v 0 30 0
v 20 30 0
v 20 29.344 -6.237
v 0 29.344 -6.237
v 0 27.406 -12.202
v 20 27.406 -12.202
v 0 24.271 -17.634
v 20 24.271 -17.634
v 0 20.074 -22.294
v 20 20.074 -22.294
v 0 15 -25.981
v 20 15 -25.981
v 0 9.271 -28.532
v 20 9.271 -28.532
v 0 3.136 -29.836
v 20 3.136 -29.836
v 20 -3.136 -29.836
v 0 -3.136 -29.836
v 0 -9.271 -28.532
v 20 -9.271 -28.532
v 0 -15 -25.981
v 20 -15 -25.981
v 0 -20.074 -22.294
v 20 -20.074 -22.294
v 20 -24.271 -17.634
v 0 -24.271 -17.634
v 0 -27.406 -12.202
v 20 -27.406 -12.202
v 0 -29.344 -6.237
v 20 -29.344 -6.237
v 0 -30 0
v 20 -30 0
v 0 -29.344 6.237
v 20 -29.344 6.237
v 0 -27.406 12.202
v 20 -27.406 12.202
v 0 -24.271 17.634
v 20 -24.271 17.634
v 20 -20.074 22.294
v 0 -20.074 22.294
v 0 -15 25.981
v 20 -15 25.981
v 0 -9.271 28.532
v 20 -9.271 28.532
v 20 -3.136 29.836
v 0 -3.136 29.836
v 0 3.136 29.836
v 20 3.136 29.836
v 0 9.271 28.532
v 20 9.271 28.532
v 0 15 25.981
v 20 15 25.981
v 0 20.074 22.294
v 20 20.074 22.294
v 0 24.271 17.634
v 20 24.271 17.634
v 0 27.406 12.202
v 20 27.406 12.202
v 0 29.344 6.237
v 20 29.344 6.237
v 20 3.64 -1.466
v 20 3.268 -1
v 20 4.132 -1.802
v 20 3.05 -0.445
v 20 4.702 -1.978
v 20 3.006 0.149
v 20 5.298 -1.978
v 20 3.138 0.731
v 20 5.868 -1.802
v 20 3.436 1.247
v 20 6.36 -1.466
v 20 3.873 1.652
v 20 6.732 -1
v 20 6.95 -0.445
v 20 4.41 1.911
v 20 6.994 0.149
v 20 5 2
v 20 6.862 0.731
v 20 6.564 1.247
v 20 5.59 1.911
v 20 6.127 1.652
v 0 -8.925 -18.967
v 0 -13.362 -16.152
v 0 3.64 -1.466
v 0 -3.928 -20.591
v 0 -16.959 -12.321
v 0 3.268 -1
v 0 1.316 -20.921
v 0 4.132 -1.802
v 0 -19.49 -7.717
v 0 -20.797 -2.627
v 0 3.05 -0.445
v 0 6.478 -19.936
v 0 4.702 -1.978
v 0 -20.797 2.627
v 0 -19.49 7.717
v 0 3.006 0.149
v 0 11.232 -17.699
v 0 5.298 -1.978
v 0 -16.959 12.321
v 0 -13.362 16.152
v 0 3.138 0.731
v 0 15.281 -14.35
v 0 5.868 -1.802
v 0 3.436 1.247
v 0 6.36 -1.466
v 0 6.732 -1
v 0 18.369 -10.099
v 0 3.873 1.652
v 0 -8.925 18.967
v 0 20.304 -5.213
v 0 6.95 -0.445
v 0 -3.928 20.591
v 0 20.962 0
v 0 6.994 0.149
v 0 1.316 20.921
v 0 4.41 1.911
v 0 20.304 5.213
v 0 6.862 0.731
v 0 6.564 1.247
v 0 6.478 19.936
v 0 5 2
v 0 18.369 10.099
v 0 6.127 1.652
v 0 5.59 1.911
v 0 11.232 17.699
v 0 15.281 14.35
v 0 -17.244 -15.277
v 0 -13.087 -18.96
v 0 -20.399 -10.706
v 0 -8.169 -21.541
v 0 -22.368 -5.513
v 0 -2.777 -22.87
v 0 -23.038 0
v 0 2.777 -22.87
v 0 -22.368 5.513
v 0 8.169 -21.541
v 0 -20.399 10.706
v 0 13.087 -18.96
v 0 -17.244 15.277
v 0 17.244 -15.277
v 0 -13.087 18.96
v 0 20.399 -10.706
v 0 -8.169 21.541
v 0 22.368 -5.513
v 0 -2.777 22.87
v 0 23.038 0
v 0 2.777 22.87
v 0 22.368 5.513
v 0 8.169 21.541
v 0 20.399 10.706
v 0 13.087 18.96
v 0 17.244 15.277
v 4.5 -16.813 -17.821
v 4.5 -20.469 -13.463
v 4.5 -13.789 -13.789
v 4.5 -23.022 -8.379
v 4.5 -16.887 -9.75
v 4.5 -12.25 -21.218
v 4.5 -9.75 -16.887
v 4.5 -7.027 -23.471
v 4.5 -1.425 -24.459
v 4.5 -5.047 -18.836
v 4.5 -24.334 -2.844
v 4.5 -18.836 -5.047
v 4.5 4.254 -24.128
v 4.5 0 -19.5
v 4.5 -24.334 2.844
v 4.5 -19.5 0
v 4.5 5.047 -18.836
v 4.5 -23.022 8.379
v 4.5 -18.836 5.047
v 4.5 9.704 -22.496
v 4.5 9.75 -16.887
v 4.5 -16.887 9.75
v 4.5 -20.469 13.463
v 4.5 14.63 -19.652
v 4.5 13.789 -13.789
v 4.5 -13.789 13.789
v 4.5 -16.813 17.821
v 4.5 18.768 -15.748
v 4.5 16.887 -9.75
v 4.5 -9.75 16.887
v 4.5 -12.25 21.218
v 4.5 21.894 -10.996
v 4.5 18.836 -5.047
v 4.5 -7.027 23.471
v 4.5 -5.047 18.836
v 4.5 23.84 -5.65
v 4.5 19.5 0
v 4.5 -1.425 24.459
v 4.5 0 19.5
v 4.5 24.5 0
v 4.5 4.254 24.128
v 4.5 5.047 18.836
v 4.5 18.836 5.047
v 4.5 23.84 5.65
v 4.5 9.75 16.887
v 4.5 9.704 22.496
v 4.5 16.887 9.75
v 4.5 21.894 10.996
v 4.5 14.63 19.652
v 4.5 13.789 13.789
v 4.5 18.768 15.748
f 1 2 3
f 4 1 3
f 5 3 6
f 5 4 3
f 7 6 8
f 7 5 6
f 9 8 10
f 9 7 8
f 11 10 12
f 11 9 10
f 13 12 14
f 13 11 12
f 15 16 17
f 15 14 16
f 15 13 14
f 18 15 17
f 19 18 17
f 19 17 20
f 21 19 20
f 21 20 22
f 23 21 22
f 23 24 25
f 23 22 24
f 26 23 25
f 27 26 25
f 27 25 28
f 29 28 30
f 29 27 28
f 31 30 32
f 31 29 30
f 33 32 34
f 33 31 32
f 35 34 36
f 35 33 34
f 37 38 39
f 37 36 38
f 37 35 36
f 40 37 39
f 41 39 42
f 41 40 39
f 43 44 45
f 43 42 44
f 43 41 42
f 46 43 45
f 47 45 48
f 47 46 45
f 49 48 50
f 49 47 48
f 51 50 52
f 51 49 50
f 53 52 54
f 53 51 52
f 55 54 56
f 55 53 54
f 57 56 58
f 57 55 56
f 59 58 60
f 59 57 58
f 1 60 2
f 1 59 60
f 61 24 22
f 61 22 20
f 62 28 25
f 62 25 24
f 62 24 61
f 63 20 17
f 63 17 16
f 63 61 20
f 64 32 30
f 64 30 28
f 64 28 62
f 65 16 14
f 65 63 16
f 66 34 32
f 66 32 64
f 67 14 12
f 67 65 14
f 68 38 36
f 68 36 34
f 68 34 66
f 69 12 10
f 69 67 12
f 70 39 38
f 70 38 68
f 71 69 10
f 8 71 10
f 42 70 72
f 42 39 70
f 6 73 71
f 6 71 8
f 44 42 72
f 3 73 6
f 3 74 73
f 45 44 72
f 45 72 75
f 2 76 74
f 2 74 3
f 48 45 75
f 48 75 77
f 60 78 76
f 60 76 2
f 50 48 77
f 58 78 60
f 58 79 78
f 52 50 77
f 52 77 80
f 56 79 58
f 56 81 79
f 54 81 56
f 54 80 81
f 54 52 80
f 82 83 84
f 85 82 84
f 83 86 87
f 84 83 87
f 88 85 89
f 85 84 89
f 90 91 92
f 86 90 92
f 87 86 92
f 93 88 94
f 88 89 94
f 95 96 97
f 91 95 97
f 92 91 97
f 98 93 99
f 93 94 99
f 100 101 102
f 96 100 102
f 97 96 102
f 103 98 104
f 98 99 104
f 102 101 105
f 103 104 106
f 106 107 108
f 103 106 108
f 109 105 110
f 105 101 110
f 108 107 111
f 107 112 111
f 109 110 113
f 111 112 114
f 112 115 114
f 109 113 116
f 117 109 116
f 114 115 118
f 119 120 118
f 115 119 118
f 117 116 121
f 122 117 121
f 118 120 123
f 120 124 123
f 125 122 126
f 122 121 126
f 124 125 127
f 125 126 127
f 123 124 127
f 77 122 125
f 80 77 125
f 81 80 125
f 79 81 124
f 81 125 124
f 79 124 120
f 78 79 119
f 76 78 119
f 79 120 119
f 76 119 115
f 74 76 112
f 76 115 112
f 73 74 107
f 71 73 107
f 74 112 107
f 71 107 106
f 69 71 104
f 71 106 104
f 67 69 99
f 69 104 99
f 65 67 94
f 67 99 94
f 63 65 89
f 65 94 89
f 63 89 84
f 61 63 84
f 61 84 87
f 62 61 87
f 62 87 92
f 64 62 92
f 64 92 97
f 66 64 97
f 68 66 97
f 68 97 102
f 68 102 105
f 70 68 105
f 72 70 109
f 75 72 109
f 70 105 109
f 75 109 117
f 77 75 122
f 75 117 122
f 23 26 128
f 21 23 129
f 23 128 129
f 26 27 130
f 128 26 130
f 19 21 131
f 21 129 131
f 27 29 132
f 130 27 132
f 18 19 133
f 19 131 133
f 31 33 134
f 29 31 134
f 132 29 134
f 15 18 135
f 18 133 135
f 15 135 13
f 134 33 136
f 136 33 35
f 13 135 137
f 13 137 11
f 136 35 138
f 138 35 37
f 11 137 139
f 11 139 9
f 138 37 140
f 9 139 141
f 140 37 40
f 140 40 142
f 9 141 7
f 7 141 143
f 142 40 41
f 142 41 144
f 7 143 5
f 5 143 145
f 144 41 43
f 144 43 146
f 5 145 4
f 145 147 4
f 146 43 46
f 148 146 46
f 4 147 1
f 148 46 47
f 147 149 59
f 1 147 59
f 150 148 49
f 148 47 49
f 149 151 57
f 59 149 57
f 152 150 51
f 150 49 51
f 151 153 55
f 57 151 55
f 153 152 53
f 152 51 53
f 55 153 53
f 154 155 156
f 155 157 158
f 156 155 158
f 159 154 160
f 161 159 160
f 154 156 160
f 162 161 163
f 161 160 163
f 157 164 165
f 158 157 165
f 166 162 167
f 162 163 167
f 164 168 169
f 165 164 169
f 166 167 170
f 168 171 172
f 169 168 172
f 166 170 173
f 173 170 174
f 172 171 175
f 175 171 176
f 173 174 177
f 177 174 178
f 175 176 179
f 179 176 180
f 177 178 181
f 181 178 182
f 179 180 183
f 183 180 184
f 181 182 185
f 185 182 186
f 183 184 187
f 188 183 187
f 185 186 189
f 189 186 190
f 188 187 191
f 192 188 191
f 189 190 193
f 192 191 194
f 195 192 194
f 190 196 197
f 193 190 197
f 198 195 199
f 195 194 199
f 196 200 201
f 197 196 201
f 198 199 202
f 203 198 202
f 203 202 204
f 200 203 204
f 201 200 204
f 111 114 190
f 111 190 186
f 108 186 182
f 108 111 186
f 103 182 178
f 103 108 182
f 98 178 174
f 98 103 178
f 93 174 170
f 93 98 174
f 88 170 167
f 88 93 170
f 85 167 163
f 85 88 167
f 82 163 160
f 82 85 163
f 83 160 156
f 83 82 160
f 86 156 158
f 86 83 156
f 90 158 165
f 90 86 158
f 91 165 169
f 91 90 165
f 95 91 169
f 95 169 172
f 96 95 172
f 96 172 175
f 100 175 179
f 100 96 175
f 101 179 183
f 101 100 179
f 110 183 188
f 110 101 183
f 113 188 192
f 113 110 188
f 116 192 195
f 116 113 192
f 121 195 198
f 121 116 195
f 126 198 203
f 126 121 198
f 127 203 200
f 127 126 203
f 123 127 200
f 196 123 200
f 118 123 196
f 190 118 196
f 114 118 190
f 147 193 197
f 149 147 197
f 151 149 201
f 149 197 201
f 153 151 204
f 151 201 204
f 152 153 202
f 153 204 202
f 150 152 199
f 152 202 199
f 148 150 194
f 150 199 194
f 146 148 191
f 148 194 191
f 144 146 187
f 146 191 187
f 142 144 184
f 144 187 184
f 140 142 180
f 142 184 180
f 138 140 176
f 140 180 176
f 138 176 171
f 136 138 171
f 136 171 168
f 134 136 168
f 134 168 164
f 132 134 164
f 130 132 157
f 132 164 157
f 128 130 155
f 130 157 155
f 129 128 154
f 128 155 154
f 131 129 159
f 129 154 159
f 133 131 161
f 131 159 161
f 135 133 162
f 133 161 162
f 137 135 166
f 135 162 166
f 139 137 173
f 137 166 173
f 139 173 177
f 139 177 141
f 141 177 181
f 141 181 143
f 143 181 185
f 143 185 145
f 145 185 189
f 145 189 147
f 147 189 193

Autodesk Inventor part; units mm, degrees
ref_plane "YZ Plane" through (0, 0, 0) normal (1, 0, 0) x (0, 1, 0)
ref_plane "XZ Plane" through (0, 0, 0) normal (0, 1, 0) x (-1, 0, 0)
ref_plane "XY Plane" through (0, 0, 0) normal (0, 0, 1) x (1, 0, 0)
sketch "Эскиз1" plane through (0, 0, 0) normal (0, 0, 1) x (1, 0, 0)
  line L0 (0, 0) -> (20, 0)
  line L1 (20, 0) -> (20, 30)
  line L2 (20, 30) -> (0, 30)
  line L3 (0, 30) -> (0, 0)
  dimension "d0" = 20
  dimension "d1" = 30
revolve "Вращение1" add sketch "Эскиз1" angle 360 about axis through (0, 0, 0) along (1, 0, 0)
sketch "Эскиз2" plane through (0, 0, 0) normal (-1, 0, 0) x (0, 0, 1)
  circle A0 centre (0, 5) radius 2
  point P0 (0, 0)
  dimension "d3" = 4
  dimension "d4" = 5
extrude "Выдавливание1" cut sketch "Эскиз2" against normal blind 20
sketch "Эскиз3" plane through (0, 0, 0) normal (0, 0, 1) x (1, 0, 0)
  line L0 (0, 3) -> (0, 7) projected
  line L1 (0, -30) -> (0, 30) construction
  line L2 (0, 22) -> (4.5, 22) construction
  line L3 (0, 23.0379) -> (4.5, 24.5)
  line L4 (4.5, 24.5) -> (4.5, 22)
  line L5 (0, 0) -> (20, 0)
  line L6 (20, -30) -> (20, 30) construction
  line L7 (0, 22) -> (0, 23.0379)
  line L8 (0, 74) -> (0, 14) construction
  line L9 (0, 20.9621) -> (4.5, 19.5)
  line L10 (4.5, 19.5) -> (4.5, 22)
  line L11 (0, 22) -> (0, 20.9621)
  dimension "d7" = 4.5
  dimension "d8" = 22
  dimension "d10" = 72
  dimension "d12" = 2.5
revolve "Вращение3" cut sketch "Эскиз3" angle 360 about axis through (0, 0, 0) along (1, 0, 0)
properties part number "711116"
